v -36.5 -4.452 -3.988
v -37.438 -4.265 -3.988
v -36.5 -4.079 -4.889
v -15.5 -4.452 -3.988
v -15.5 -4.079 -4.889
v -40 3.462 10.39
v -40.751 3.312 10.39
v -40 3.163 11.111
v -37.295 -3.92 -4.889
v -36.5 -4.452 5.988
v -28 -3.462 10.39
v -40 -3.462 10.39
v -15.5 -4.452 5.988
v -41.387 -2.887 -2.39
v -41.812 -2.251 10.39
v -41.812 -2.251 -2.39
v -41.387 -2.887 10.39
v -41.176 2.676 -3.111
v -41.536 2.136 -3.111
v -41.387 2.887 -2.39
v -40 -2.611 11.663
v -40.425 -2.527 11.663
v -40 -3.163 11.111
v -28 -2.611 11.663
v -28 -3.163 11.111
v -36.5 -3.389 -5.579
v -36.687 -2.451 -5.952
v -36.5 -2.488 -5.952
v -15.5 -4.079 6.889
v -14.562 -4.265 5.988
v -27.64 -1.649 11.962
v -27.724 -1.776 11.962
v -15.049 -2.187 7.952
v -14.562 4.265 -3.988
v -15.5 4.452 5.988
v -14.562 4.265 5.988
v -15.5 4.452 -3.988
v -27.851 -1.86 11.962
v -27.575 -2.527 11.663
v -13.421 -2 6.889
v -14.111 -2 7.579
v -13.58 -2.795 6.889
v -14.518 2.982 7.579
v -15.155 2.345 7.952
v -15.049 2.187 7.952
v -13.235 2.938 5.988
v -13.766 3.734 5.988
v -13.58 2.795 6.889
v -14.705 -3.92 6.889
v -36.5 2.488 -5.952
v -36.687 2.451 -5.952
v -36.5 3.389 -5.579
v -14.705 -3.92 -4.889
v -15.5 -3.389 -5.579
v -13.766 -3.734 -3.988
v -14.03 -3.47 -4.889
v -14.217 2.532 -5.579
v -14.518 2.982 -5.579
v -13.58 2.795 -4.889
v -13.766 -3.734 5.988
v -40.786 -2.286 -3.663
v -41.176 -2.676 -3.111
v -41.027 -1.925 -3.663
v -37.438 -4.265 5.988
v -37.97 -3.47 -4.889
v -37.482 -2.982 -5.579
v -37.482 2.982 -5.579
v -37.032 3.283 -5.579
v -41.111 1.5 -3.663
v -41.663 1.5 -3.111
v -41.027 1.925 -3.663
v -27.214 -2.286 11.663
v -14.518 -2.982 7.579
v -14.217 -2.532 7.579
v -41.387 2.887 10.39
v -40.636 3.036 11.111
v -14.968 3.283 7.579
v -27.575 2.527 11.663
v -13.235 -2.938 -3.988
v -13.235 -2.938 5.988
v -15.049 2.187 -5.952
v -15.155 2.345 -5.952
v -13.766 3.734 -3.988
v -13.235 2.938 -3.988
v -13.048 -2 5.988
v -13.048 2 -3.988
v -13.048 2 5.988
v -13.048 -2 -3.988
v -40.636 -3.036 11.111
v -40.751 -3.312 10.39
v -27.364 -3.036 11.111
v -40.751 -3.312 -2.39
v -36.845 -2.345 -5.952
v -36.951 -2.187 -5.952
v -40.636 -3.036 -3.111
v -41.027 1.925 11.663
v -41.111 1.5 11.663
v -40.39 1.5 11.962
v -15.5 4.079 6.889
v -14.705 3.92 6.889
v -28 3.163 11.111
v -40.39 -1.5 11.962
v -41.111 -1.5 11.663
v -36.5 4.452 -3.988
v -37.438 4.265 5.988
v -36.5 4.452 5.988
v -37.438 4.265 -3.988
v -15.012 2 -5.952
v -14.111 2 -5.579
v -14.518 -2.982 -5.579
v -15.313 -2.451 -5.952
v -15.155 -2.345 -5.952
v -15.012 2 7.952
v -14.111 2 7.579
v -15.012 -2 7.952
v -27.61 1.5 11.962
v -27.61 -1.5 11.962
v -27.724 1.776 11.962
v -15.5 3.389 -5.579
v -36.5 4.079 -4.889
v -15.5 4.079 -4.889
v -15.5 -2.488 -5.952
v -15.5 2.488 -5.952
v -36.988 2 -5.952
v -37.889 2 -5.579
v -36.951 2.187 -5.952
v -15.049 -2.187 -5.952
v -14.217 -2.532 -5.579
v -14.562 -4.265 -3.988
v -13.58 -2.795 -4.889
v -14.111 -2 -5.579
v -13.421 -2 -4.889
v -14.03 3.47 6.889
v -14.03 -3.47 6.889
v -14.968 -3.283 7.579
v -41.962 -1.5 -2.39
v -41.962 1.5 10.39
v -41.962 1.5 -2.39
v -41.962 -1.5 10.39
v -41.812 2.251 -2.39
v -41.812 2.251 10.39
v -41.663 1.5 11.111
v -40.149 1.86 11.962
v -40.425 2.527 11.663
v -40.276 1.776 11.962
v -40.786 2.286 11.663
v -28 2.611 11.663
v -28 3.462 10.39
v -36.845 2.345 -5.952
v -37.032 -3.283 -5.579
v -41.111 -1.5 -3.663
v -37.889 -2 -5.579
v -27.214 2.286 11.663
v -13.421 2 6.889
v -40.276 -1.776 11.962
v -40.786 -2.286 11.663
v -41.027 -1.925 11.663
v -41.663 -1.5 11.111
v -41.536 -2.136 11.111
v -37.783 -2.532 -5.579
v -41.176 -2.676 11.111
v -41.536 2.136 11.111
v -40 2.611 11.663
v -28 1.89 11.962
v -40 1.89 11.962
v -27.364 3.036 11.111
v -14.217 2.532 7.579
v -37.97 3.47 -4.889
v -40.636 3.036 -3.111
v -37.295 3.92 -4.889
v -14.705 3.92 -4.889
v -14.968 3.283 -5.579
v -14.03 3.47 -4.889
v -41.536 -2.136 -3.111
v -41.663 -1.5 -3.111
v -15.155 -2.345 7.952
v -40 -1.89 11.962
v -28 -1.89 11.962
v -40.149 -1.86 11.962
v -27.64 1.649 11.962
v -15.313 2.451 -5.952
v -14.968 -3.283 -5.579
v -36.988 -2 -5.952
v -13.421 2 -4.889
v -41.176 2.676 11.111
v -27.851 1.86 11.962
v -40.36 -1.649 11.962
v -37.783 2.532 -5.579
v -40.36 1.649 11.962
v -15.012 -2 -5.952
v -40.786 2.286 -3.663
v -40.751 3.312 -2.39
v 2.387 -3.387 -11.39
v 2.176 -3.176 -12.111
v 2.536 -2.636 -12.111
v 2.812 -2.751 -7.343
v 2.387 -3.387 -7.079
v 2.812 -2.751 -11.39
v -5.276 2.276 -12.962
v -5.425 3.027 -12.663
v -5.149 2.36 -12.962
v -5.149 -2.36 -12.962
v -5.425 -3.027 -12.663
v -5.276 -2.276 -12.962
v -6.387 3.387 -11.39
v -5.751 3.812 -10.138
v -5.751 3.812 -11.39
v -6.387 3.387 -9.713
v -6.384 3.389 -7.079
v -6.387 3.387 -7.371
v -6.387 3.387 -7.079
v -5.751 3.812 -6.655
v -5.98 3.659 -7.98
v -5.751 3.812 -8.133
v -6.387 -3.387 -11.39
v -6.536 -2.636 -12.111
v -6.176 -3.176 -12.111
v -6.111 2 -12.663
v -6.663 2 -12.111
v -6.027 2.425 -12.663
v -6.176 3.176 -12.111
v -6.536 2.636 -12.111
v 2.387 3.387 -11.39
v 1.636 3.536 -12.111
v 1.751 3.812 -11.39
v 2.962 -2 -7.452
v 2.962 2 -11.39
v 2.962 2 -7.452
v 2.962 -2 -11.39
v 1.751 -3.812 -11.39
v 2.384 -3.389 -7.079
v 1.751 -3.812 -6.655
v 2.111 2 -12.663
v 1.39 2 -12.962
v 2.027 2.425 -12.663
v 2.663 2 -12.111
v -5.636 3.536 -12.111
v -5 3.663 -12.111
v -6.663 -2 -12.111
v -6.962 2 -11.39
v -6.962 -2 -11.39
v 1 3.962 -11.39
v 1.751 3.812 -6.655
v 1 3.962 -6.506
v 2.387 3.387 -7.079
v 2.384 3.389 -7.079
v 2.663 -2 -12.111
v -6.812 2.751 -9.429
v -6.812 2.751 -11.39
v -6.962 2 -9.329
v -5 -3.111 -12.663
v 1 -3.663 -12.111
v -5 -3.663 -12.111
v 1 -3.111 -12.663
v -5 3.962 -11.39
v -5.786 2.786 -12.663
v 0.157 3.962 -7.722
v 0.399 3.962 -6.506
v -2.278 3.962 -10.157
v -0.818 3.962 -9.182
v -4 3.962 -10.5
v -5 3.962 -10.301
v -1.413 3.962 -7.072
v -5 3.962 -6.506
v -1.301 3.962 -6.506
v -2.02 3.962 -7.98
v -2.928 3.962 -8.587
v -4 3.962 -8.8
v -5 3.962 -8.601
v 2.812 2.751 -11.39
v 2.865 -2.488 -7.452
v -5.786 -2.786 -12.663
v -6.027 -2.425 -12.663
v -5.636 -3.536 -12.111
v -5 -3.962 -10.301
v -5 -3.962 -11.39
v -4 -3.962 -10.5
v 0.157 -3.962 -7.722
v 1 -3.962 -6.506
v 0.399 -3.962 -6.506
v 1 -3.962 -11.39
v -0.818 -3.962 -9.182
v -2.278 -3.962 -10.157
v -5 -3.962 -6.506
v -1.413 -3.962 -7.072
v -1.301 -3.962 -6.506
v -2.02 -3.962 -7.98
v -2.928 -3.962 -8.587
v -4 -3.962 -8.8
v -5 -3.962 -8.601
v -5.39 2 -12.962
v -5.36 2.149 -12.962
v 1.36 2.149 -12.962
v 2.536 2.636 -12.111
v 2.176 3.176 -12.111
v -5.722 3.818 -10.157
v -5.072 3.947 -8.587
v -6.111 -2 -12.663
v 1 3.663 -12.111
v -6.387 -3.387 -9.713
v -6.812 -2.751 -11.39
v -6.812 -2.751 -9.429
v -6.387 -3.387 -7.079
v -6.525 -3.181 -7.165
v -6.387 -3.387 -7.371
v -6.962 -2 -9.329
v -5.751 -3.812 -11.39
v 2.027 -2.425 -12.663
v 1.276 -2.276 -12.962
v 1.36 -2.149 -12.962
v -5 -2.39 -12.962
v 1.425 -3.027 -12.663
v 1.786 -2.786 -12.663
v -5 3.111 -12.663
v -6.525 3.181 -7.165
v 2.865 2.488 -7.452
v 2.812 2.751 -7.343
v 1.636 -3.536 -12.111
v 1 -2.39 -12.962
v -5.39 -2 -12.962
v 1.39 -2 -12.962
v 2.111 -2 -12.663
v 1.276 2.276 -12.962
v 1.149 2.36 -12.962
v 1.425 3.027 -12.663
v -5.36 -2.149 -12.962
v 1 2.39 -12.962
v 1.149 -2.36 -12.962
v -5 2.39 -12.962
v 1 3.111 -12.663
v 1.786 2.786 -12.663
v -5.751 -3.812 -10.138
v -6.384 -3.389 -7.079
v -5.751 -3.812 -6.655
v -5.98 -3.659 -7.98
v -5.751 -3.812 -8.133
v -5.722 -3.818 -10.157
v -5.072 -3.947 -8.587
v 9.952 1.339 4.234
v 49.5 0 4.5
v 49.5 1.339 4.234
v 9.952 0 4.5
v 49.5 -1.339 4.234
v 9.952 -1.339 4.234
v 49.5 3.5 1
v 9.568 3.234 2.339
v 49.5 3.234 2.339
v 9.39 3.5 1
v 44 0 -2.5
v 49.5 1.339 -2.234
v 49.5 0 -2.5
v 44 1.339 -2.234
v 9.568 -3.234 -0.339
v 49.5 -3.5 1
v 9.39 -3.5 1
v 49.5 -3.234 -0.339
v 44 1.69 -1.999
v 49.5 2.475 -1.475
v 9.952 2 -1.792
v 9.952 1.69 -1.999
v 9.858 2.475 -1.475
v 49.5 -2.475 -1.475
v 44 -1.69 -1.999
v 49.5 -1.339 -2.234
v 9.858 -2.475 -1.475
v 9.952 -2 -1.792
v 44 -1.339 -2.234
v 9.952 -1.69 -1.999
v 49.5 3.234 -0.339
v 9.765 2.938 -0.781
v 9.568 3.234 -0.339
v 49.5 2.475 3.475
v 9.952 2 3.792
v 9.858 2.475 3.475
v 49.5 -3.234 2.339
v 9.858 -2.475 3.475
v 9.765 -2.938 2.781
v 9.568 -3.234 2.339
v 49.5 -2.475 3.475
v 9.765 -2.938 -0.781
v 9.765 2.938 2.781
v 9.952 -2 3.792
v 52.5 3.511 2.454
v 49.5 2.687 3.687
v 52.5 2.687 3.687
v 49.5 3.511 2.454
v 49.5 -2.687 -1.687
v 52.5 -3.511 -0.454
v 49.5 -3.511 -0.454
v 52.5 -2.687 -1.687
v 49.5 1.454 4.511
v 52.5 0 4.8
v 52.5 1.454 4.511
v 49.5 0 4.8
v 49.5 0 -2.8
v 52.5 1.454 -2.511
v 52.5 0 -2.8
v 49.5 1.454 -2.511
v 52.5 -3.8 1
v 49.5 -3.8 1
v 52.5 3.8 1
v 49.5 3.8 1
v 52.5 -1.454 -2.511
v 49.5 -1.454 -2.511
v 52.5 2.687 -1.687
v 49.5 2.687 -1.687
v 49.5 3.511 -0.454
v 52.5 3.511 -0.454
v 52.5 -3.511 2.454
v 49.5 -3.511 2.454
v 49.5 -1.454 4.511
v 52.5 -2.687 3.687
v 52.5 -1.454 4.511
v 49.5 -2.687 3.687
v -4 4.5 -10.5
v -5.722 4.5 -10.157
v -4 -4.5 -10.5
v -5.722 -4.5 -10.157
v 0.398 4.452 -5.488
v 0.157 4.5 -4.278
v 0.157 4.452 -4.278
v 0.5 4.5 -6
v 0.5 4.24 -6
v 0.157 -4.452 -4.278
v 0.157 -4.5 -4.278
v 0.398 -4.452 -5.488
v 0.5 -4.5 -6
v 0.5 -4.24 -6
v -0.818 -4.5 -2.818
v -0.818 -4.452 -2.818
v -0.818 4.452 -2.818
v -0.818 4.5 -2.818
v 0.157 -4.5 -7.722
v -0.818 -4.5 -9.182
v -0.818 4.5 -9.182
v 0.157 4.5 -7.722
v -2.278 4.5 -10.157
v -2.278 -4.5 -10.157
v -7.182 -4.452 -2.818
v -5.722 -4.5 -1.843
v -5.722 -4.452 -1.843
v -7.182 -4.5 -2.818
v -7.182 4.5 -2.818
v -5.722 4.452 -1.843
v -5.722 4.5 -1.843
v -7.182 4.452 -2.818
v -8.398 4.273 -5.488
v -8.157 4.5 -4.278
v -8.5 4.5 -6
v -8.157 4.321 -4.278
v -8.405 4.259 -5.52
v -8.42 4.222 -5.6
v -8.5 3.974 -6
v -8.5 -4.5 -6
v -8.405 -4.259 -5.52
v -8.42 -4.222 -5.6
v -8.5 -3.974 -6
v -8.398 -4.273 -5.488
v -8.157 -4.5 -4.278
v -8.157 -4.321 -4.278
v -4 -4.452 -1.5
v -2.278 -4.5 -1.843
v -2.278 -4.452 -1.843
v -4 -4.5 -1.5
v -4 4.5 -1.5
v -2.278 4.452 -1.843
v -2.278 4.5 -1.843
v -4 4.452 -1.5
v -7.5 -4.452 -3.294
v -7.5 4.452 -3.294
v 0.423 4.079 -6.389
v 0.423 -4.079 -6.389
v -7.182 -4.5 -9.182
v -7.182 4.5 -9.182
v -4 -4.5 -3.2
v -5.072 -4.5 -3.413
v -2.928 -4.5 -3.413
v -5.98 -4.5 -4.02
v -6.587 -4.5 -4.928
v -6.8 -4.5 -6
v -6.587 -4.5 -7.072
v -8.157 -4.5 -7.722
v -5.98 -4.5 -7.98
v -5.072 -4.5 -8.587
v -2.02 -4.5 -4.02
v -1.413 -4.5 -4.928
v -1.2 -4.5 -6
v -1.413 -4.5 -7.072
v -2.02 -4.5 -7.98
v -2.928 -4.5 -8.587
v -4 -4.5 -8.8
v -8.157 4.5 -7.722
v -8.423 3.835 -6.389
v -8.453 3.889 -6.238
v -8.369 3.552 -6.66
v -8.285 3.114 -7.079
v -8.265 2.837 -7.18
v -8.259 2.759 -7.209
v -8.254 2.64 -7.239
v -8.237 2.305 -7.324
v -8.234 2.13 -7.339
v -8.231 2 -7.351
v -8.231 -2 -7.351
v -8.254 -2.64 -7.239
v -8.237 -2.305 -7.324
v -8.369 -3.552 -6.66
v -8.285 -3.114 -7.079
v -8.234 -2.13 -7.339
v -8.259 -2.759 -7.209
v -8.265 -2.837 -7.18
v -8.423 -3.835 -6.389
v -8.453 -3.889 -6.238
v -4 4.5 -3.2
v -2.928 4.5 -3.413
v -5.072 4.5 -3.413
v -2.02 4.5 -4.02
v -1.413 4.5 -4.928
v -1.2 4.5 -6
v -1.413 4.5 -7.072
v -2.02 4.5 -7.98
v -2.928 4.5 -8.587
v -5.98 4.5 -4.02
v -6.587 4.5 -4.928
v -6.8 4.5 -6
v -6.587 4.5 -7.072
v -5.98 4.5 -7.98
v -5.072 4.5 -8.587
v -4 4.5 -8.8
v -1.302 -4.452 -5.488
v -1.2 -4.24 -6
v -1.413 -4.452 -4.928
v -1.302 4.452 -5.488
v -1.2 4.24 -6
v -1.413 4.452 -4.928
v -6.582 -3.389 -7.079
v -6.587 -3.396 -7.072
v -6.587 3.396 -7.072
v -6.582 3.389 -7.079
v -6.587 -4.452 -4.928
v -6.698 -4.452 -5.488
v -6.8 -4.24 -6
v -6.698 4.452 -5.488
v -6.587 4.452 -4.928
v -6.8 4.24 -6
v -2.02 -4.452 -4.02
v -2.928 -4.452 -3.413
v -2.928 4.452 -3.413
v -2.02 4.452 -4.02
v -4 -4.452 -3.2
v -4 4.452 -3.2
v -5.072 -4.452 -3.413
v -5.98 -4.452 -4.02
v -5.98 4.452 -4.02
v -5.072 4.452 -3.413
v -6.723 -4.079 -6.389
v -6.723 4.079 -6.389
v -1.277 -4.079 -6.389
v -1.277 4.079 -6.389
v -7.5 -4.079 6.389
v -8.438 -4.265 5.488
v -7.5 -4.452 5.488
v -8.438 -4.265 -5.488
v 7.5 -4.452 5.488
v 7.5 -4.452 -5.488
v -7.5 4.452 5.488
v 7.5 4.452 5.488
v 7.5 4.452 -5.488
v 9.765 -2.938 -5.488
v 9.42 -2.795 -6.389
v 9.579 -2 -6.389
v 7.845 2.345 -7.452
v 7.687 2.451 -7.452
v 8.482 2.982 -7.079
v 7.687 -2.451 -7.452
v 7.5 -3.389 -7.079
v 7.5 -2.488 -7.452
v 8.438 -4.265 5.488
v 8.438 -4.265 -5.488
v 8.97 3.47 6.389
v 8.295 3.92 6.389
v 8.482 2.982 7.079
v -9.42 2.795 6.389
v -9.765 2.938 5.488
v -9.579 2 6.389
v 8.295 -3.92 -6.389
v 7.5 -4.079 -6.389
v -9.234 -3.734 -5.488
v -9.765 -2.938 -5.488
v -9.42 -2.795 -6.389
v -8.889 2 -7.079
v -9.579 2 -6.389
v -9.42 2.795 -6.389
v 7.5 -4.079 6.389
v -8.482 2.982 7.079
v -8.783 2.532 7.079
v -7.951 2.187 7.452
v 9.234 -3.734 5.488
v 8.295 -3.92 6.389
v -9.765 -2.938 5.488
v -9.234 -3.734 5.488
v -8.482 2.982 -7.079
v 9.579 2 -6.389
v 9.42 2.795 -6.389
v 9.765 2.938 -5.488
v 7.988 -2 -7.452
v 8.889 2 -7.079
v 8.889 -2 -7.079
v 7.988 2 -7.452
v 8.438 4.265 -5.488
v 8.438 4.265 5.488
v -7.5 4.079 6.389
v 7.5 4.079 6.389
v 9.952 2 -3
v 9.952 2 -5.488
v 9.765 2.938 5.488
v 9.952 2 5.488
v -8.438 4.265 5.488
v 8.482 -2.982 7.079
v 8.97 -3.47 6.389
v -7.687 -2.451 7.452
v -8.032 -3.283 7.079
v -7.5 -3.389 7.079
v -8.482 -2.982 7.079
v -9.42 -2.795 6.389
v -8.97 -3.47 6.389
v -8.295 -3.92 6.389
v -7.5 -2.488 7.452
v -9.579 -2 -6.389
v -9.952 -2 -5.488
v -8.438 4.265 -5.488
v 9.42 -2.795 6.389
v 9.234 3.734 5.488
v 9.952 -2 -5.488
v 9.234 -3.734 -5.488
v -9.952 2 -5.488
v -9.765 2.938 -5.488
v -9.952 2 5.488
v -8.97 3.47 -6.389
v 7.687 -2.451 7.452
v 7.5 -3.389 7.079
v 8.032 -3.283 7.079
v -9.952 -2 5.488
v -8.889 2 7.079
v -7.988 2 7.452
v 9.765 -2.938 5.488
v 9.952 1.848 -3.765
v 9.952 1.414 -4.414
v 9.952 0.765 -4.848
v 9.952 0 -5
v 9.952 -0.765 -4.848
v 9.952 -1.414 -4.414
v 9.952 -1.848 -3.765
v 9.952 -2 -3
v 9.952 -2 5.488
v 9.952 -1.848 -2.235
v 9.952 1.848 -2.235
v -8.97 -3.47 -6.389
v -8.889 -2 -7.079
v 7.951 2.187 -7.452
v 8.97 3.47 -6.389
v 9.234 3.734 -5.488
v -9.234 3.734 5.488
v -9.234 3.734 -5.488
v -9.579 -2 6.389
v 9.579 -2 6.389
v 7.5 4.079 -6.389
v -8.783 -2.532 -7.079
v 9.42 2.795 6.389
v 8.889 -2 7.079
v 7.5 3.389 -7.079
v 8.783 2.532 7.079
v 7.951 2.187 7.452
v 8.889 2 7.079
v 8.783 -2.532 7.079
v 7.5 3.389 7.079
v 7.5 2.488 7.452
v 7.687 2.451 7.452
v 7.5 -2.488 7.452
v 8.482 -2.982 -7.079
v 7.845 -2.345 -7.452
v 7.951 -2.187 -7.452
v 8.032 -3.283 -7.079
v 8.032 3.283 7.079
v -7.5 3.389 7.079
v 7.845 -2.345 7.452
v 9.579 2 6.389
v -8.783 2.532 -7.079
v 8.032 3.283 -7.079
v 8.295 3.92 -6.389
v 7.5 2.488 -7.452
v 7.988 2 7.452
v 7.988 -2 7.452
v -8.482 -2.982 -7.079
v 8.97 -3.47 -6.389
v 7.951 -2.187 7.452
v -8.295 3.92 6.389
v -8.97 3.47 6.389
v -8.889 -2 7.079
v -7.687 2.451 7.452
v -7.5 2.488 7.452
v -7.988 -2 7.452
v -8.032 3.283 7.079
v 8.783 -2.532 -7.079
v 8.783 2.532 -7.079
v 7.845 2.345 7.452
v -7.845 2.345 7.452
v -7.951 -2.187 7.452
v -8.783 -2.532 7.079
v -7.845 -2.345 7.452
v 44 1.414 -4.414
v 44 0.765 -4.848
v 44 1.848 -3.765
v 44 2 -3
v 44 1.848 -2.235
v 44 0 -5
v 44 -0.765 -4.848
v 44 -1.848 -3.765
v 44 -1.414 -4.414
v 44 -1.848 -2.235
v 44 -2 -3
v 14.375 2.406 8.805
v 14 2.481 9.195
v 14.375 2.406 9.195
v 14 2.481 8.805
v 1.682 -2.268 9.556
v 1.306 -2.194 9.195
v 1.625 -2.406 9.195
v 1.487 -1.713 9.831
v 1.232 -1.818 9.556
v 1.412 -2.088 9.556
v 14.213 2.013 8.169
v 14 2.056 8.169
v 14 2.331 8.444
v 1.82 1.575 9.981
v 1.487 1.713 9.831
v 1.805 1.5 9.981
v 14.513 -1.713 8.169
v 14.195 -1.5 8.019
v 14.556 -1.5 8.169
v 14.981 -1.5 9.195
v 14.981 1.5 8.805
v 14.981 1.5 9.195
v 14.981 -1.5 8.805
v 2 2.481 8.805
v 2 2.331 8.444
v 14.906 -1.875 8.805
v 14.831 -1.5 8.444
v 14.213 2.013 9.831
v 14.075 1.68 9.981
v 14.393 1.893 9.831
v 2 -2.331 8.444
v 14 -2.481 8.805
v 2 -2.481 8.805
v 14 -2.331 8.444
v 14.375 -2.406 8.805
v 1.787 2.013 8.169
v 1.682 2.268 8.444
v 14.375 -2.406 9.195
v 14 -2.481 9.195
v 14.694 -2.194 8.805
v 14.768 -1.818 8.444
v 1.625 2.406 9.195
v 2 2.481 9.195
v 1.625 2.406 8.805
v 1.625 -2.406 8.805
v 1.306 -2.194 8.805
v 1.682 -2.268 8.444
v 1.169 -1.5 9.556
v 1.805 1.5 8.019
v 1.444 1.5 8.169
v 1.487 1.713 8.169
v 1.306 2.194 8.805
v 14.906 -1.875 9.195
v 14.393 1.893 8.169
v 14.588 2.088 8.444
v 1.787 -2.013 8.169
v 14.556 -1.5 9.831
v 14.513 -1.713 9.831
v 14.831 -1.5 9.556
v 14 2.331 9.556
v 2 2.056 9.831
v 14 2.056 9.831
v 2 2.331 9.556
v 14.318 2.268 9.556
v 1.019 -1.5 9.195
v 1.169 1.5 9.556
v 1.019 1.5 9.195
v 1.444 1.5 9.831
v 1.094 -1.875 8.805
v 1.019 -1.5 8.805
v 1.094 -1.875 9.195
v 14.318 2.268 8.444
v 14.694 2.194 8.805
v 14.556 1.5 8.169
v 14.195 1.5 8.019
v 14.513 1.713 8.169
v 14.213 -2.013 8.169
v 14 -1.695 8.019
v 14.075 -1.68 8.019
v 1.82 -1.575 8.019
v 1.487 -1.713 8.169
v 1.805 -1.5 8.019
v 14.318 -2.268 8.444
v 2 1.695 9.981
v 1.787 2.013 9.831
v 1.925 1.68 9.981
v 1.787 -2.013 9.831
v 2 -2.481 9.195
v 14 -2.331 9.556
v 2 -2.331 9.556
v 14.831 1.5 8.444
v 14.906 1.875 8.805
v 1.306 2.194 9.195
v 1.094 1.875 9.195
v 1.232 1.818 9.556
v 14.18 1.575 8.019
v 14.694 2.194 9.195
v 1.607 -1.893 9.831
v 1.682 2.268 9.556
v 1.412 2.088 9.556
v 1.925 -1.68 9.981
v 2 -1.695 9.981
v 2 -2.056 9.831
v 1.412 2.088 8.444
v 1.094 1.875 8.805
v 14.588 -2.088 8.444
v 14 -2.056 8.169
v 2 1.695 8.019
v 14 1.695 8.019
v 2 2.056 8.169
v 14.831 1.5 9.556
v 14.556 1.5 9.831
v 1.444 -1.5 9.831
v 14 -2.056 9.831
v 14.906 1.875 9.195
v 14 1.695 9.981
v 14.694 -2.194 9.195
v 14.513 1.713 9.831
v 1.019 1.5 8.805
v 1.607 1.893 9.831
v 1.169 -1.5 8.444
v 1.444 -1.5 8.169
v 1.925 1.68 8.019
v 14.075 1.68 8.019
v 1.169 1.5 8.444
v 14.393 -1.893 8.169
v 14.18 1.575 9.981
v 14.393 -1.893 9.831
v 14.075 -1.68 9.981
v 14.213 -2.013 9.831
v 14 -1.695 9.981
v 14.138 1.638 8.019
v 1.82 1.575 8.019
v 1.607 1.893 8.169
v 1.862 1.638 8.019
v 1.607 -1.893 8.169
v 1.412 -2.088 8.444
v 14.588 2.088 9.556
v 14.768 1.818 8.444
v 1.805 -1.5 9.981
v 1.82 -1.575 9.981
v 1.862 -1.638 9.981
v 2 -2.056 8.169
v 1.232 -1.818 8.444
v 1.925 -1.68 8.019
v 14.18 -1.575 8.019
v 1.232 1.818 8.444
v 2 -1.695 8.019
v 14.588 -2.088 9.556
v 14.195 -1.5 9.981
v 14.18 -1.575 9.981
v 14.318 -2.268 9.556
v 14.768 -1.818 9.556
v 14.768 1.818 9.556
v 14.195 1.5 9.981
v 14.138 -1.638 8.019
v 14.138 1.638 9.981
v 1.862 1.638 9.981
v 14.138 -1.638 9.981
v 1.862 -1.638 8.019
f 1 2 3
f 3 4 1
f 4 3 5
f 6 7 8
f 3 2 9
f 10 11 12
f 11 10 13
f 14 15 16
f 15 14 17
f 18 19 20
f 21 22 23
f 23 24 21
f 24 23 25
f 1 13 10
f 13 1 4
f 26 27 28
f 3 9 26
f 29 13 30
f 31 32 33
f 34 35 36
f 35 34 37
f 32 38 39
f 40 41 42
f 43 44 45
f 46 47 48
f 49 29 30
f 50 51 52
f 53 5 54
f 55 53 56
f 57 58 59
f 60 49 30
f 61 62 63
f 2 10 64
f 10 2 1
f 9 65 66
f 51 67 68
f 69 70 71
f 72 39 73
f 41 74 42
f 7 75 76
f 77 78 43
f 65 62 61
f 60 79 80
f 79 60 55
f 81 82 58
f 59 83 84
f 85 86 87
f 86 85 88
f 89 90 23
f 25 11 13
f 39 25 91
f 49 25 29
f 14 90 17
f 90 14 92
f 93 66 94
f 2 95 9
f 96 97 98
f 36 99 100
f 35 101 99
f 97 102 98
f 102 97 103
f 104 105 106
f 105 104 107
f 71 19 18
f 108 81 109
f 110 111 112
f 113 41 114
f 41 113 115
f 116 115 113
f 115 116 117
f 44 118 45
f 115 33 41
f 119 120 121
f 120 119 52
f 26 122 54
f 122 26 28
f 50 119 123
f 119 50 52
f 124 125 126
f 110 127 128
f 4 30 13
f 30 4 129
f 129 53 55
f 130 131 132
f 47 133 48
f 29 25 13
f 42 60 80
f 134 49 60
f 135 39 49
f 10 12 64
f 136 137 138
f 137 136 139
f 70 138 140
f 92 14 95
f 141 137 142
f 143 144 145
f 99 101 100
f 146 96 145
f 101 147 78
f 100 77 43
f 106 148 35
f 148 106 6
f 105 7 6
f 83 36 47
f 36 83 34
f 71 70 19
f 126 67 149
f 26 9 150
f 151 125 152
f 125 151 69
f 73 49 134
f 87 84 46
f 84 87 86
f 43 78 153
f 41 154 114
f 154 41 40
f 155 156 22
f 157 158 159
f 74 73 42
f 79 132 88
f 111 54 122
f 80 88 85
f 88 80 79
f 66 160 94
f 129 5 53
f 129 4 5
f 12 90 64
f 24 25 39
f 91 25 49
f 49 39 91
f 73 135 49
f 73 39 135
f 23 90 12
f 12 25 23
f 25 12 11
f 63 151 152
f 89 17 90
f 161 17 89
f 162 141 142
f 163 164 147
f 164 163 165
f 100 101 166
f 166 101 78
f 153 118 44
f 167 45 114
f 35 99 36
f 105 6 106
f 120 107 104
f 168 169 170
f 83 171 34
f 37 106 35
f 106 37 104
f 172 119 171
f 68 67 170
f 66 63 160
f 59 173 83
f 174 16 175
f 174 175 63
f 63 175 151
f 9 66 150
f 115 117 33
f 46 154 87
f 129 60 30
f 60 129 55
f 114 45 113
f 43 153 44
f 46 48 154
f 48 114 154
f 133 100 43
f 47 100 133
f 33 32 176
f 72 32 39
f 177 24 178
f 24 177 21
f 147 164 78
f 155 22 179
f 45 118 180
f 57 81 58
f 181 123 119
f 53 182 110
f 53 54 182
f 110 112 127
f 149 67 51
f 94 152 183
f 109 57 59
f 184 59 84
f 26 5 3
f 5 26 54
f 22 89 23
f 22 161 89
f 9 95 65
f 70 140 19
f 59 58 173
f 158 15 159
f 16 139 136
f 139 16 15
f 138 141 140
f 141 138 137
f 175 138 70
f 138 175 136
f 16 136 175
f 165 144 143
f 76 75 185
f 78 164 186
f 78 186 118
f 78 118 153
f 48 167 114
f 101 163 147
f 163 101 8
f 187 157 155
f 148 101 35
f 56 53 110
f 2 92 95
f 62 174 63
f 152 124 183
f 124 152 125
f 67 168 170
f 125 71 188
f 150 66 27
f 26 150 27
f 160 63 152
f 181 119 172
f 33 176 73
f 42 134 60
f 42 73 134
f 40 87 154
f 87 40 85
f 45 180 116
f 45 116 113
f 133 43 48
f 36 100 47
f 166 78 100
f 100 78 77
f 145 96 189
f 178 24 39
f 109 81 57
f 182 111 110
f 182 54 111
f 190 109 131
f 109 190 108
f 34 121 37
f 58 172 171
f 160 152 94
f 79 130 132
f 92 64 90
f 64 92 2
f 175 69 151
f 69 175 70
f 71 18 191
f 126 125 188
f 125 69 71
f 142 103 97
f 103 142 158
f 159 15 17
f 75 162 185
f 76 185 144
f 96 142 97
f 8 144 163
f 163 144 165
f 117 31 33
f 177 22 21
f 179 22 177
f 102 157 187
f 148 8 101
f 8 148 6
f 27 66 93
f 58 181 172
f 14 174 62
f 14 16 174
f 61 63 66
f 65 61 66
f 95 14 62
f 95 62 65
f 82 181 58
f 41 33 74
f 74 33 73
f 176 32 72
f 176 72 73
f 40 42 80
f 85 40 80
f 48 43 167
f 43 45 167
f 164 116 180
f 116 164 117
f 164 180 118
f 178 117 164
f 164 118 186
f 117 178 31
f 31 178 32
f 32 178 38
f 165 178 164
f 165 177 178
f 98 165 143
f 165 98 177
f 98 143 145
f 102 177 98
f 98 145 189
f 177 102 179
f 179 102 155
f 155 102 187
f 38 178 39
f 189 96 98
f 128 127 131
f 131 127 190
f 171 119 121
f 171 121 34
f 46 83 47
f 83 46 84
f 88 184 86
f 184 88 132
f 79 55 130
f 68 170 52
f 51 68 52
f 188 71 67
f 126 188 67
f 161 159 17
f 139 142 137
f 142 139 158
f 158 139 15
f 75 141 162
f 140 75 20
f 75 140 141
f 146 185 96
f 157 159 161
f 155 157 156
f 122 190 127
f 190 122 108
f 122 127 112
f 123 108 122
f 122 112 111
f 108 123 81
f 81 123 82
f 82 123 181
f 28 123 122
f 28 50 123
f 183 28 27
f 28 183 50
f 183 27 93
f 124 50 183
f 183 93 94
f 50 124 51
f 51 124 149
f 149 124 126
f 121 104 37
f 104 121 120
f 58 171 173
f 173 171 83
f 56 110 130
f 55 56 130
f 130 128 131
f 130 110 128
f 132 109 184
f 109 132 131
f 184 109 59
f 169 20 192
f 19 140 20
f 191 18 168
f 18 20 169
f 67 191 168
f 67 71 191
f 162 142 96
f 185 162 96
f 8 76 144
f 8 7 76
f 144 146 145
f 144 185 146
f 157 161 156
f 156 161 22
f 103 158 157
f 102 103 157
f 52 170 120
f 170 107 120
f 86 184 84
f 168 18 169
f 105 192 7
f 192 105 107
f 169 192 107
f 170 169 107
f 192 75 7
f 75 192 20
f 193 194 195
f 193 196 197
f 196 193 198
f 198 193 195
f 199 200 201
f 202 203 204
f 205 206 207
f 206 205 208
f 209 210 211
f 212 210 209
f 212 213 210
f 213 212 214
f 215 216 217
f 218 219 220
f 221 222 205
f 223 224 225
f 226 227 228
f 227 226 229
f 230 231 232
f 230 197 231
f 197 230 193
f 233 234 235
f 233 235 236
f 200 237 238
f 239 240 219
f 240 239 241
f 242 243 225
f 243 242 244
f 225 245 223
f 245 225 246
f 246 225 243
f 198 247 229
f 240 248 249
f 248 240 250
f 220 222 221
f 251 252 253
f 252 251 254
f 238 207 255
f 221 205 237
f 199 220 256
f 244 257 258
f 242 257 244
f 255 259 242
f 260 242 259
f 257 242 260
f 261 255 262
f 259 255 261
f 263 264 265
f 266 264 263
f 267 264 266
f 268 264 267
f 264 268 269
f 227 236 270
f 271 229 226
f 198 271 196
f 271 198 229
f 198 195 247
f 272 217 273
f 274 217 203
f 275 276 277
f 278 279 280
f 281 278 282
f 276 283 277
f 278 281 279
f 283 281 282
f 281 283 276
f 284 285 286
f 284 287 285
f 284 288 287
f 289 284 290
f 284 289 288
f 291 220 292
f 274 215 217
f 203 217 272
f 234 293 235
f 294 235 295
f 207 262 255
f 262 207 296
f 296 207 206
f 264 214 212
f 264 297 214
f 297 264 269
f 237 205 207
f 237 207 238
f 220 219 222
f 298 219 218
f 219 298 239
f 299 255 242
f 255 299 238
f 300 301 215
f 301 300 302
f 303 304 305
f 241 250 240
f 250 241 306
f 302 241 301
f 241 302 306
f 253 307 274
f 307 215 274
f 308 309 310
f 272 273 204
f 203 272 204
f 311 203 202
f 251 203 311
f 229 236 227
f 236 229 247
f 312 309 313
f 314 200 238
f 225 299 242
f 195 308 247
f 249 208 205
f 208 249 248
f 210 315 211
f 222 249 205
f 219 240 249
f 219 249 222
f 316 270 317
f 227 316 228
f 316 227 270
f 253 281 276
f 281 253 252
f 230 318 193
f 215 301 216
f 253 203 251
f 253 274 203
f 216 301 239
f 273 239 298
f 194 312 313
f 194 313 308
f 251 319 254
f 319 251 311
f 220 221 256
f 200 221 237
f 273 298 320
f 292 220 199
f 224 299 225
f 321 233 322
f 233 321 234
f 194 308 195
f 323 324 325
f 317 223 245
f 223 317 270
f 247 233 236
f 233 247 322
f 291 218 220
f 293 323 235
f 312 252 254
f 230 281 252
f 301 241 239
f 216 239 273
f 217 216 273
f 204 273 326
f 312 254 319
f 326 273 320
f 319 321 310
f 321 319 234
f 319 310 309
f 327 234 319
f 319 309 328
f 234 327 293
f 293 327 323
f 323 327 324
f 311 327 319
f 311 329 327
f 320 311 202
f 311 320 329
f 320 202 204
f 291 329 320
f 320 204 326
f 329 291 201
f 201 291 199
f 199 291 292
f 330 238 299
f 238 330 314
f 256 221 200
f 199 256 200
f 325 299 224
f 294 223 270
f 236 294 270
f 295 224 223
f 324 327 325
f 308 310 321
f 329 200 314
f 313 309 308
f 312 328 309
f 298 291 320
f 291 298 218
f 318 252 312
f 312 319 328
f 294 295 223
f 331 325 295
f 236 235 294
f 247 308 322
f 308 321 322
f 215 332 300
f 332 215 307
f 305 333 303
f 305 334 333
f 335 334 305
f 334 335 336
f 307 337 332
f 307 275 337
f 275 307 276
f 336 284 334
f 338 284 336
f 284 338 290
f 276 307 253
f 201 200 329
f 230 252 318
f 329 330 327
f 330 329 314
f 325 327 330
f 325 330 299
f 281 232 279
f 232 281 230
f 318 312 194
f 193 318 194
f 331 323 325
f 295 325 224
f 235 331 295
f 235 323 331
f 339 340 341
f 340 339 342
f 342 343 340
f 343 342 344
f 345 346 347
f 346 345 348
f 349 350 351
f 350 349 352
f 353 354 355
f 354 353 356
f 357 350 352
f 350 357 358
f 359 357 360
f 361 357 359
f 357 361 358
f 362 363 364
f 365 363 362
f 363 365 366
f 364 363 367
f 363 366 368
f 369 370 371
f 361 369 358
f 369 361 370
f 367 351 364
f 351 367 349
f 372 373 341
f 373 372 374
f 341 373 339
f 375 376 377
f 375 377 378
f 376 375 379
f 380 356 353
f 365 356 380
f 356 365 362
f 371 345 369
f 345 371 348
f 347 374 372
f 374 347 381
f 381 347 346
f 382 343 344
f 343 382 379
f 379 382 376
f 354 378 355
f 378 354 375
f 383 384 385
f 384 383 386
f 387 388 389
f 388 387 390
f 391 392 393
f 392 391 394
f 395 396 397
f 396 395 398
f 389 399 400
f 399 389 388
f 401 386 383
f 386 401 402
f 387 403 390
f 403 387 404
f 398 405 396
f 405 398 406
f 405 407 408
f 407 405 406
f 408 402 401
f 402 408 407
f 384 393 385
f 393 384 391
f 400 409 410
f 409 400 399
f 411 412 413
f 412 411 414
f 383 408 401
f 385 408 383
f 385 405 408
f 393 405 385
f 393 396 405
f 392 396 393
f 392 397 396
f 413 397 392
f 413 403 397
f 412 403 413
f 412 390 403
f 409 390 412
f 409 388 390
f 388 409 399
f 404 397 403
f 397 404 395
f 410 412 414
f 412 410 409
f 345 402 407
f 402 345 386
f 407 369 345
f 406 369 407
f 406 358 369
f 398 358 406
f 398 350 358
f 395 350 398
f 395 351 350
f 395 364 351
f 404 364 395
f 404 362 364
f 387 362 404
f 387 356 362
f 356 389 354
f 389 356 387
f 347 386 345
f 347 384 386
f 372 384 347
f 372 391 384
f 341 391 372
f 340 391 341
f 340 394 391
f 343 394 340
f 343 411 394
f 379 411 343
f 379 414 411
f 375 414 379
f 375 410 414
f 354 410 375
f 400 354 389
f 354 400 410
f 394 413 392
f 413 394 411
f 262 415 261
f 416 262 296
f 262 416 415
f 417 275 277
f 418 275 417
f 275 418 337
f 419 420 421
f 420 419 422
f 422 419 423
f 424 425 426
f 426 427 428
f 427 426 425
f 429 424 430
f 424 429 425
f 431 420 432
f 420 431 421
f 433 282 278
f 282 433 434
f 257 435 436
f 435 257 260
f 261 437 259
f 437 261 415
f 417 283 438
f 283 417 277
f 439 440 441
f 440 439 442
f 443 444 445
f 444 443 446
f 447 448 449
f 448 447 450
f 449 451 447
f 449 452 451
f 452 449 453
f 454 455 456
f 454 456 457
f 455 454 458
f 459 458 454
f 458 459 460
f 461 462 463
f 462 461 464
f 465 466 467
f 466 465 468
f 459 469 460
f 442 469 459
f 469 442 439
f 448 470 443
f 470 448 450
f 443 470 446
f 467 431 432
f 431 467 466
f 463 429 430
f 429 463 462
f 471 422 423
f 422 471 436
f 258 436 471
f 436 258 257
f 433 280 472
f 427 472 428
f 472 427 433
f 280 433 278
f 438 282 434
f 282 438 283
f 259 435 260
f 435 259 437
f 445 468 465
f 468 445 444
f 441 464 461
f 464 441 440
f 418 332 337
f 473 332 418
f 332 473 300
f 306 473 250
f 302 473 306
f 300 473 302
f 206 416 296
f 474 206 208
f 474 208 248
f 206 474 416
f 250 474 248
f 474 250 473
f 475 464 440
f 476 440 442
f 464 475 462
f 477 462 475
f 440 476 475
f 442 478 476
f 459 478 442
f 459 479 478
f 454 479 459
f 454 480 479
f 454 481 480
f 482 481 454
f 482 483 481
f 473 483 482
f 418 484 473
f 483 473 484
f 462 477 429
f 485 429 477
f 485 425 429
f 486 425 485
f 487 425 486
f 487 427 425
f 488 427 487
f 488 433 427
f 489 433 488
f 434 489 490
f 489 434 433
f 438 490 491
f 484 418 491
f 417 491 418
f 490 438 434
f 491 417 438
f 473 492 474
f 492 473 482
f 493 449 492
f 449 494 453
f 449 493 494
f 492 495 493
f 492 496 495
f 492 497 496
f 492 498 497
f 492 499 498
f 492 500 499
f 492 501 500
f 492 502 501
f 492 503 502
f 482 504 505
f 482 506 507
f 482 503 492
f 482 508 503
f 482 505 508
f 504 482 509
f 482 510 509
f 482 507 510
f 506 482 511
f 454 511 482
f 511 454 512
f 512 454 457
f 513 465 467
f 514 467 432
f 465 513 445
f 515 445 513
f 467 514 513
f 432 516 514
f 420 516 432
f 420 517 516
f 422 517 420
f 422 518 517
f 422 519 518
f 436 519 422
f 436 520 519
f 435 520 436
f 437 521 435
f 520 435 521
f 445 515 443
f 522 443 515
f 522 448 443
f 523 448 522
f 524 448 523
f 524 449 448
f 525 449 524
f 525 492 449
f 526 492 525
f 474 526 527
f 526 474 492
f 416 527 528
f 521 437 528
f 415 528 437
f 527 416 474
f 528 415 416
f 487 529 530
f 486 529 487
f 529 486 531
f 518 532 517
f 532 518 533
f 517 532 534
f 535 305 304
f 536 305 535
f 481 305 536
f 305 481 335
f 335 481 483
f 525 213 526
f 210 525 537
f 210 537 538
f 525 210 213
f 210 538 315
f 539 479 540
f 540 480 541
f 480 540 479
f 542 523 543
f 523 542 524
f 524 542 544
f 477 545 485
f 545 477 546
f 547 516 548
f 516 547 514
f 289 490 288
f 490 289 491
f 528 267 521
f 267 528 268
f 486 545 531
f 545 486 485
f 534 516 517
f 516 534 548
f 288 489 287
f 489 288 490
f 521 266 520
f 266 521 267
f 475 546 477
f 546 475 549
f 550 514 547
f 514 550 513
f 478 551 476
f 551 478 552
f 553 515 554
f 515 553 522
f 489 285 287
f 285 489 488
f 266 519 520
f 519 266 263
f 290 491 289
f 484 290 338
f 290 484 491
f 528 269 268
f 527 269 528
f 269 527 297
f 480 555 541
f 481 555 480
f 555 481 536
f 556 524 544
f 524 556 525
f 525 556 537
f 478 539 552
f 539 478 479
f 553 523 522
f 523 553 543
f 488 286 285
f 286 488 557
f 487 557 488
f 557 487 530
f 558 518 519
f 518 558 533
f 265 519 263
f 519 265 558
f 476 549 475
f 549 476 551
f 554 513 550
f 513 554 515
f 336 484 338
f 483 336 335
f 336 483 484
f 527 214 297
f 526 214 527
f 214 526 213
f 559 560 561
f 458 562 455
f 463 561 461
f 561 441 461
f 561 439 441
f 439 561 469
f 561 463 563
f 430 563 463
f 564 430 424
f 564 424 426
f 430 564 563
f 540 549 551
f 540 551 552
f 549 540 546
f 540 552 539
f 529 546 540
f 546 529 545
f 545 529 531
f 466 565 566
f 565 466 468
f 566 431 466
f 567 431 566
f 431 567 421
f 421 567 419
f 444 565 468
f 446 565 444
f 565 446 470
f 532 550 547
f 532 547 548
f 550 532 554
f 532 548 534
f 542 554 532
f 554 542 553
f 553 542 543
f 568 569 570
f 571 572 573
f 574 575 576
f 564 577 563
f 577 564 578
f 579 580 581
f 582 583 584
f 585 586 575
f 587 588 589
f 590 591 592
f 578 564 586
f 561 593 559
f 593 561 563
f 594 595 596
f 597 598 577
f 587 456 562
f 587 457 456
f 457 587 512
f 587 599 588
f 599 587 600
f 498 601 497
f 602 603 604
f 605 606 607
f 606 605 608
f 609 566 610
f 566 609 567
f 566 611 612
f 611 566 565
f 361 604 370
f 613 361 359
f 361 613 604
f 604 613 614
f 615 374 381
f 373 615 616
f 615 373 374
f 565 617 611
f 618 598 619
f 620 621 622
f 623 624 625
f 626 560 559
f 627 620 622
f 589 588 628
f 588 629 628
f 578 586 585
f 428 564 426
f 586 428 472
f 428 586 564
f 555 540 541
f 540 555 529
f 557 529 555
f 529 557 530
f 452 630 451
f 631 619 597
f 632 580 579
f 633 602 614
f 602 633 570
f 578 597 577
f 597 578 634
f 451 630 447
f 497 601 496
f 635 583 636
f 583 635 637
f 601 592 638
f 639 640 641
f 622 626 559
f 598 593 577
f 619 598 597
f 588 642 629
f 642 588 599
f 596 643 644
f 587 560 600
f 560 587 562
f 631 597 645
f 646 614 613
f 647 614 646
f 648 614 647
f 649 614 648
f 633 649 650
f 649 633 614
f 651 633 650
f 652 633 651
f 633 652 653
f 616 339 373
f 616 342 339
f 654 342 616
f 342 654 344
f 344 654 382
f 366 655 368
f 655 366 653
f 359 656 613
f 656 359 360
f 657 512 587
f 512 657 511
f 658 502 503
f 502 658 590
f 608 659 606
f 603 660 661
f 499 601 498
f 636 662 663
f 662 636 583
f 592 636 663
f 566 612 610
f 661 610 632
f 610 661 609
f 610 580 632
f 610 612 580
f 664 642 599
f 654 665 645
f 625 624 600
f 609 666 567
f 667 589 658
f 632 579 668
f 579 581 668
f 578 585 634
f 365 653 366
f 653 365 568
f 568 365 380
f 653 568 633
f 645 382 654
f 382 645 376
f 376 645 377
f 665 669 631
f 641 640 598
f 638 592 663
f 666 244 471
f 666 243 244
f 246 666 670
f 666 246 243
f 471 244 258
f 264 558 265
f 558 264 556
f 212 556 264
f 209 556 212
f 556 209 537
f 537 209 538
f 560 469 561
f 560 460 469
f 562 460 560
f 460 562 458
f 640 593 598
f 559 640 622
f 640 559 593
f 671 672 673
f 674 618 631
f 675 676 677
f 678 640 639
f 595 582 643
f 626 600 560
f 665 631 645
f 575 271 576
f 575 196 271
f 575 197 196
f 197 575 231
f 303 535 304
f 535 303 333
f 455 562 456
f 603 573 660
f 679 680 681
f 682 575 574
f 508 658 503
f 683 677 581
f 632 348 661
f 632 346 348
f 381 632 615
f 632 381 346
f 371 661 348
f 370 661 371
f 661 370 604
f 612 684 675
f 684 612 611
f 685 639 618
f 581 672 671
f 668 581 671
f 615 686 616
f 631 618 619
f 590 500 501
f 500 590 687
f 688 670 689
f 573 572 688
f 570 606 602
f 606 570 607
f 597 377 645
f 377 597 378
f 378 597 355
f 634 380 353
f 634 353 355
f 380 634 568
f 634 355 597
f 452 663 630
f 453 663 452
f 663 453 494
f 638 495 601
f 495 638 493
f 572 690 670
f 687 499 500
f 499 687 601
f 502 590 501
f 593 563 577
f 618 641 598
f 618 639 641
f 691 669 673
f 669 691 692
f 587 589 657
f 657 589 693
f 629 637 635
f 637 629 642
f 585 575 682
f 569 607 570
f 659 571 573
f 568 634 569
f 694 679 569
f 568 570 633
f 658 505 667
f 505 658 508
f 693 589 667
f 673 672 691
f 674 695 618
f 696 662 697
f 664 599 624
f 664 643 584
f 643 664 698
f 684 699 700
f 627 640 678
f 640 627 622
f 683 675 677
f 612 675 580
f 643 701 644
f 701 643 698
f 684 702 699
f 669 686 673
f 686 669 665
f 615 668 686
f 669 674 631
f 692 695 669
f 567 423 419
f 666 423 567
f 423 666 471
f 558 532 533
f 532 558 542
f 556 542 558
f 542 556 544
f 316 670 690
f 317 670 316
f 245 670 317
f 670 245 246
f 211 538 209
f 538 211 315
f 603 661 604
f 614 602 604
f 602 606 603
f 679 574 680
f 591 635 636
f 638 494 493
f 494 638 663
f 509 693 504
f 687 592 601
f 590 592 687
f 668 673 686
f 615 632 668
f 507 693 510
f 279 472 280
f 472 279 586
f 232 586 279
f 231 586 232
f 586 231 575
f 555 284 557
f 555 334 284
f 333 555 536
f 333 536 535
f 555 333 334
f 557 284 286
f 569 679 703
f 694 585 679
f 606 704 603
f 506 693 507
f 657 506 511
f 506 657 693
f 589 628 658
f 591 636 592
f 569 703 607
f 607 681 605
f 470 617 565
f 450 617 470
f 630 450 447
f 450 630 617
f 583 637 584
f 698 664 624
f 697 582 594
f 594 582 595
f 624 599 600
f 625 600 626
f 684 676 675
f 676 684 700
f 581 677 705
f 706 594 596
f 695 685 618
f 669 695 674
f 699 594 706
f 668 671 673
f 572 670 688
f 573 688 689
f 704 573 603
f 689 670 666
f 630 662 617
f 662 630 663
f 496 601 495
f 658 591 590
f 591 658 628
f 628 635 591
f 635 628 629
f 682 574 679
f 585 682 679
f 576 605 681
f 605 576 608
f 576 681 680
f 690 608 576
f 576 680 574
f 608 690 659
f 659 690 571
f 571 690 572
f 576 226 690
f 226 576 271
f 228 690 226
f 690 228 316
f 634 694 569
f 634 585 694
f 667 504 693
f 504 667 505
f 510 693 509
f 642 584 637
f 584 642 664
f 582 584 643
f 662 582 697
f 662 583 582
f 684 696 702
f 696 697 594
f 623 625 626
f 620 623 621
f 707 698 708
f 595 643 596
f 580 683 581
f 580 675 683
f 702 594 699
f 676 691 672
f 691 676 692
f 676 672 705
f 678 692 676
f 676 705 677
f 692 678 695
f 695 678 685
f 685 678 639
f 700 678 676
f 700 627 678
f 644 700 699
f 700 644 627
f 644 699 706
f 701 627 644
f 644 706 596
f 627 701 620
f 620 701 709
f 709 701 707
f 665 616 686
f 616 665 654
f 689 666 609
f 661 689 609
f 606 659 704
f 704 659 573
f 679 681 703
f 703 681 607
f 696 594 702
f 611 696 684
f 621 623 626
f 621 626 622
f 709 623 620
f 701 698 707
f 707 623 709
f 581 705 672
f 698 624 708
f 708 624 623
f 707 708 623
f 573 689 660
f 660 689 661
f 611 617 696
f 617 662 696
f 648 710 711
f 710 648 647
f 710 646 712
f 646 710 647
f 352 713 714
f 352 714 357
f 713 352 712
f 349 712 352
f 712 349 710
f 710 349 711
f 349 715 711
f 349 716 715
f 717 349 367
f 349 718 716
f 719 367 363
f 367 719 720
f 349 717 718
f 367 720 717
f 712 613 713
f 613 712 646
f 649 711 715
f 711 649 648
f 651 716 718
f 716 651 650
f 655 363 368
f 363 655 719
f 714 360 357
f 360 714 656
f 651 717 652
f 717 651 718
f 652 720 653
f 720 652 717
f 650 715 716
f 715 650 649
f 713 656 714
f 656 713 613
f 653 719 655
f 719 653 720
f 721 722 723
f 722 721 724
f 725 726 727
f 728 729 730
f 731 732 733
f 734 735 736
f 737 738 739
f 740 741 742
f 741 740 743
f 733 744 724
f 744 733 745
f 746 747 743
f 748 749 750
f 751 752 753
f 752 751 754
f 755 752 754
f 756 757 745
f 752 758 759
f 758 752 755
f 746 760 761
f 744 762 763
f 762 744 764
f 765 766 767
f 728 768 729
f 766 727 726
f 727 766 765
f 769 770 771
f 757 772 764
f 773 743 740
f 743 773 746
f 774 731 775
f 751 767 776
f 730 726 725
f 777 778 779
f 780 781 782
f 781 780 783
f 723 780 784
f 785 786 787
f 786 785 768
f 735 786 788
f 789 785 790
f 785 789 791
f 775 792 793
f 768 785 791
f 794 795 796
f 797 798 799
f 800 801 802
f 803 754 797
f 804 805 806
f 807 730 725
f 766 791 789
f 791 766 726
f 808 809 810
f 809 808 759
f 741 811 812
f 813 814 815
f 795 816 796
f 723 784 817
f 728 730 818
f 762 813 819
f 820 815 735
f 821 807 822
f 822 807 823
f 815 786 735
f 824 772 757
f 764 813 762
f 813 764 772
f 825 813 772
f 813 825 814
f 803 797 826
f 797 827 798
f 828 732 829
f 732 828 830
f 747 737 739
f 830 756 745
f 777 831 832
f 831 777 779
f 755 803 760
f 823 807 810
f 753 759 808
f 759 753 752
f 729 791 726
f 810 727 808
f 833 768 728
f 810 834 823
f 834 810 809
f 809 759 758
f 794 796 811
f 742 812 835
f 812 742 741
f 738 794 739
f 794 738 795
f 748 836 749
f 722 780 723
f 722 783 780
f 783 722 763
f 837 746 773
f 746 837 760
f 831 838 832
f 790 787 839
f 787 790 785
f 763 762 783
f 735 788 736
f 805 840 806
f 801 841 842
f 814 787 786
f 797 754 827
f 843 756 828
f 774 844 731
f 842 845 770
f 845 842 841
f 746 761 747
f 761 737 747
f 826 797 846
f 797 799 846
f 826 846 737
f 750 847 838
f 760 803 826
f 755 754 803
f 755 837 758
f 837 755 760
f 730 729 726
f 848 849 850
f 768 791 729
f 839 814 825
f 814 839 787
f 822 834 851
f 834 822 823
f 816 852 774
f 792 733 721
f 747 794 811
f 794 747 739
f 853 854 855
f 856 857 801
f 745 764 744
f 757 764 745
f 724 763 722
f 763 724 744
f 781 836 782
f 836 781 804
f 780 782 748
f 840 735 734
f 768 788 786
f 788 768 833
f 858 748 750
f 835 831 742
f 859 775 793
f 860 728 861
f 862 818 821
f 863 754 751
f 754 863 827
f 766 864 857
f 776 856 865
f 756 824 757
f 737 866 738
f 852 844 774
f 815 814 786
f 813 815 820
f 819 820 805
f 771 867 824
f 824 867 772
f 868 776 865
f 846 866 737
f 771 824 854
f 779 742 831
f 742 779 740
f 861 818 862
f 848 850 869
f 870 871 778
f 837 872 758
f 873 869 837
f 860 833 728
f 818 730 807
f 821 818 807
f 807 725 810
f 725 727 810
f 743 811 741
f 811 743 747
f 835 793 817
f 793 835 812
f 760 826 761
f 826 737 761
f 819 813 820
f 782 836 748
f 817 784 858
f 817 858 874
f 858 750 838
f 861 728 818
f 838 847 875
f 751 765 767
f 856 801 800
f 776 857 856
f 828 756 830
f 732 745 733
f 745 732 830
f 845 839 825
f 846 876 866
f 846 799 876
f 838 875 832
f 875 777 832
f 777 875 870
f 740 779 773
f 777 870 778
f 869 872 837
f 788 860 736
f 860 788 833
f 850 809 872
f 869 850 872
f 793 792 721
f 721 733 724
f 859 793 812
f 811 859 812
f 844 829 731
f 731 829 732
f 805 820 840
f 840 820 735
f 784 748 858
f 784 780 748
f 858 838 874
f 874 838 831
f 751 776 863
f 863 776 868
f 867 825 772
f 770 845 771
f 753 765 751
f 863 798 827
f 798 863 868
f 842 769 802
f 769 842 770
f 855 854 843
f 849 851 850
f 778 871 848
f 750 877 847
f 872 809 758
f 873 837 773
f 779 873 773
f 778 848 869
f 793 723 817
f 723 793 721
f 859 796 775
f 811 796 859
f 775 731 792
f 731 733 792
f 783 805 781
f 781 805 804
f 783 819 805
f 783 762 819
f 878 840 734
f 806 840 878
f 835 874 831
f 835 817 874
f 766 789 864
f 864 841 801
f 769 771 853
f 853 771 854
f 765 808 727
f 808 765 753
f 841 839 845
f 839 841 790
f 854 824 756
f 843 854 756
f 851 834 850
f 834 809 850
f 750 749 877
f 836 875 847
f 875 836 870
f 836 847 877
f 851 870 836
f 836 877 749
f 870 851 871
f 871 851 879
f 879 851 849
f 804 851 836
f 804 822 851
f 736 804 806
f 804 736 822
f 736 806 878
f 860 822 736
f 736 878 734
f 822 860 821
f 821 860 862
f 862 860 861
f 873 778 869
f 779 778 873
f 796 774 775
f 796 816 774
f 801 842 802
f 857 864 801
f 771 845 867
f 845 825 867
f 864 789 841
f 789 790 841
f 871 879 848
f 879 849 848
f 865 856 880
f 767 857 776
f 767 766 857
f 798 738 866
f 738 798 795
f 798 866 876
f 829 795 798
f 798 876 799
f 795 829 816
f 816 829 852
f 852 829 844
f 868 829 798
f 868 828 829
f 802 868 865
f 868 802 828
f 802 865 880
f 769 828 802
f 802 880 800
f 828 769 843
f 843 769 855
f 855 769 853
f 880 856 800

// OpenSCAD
// 泵动霰弹枪枪身（不含前护木）— 精细版 v2
// +X = 枪口方向，木质枪托
$fn = 16;

module rbox(x,y,z,r=1.2){
  hull(){
    translate([-x/2+r,-y/2+r,-z/2+r]) sphere(r);
    translate([ x/2-r,-y/2+r,-z/2+r]) sphere(r);
    translate([-x/2+r, y/2-r,-z/2+r]) sphere(r);
    translate([ x/2-r, y/2-r,-z/2+r]) sphere(r);
    translate([-x/2+r,-y/2+r, z/2-r]) sphere(r);
    translate([ x/2-r,-y/2+r, z/2-r]) sphere(r);
    translate([-x/2+r, y/2-r, z/2-r]) sphere(r);
    translate([ x/2-r, y/2-r, z/2-r]) sphere(r);
  }
}

COL_FRAME = "#2f333a";
COL_WOOD  = "#6b4f33";
COL_DARK  = "#15181c";
COL_STEEL = "#7a8089";

// 木制枪托 + 前握把（木质，斜面造型）
color(COL_WOOD){
  translate([-26,0,1]) hull(){
    rbox(26,9,14,2.5);
    translate([-8,0,3]) rbox(16,7,16,2);
  }
  // 前握把小木块
  translate([-2,0,-7]) rbox(10,8,12,2);
}

// 机匣 receiver
color(COL_FRAME) rbox(20,9,15,2.5);   // X -10..10

// 枪管 barrel（泵动霰弹，中等长度）+ 枪口
color(COL_STEEL){
  translate([30,0,1]) rotate([0,90,0]) cylinder(h=42,r=3.5,center=true);
  translate([51,0,1]) rotate([0,90,0]) cylinder(h=3,r=3.8,center=true);
}
// 管状弹仓（枪管下方）
color(COL_DARK) translate([26,0,-3]) rotate([0,90,0]) cylinder(h=36,r=2,center=true);

// 扳机护圈
color(COL_DARK){
  difference(){
    translate([-4,0,-6]) rotate([90,0,0]) cylinder(h=9,r=4.5,center=true);
    translate([-4,0,-6]) rotate([90,0,0]) cylinder(h=9.6,r=2.8,center=true);
  }
}
// 顶部简易瞄具座
color(COL_DARK) translate([8,0,9]) rbox(14,5,2,1);
